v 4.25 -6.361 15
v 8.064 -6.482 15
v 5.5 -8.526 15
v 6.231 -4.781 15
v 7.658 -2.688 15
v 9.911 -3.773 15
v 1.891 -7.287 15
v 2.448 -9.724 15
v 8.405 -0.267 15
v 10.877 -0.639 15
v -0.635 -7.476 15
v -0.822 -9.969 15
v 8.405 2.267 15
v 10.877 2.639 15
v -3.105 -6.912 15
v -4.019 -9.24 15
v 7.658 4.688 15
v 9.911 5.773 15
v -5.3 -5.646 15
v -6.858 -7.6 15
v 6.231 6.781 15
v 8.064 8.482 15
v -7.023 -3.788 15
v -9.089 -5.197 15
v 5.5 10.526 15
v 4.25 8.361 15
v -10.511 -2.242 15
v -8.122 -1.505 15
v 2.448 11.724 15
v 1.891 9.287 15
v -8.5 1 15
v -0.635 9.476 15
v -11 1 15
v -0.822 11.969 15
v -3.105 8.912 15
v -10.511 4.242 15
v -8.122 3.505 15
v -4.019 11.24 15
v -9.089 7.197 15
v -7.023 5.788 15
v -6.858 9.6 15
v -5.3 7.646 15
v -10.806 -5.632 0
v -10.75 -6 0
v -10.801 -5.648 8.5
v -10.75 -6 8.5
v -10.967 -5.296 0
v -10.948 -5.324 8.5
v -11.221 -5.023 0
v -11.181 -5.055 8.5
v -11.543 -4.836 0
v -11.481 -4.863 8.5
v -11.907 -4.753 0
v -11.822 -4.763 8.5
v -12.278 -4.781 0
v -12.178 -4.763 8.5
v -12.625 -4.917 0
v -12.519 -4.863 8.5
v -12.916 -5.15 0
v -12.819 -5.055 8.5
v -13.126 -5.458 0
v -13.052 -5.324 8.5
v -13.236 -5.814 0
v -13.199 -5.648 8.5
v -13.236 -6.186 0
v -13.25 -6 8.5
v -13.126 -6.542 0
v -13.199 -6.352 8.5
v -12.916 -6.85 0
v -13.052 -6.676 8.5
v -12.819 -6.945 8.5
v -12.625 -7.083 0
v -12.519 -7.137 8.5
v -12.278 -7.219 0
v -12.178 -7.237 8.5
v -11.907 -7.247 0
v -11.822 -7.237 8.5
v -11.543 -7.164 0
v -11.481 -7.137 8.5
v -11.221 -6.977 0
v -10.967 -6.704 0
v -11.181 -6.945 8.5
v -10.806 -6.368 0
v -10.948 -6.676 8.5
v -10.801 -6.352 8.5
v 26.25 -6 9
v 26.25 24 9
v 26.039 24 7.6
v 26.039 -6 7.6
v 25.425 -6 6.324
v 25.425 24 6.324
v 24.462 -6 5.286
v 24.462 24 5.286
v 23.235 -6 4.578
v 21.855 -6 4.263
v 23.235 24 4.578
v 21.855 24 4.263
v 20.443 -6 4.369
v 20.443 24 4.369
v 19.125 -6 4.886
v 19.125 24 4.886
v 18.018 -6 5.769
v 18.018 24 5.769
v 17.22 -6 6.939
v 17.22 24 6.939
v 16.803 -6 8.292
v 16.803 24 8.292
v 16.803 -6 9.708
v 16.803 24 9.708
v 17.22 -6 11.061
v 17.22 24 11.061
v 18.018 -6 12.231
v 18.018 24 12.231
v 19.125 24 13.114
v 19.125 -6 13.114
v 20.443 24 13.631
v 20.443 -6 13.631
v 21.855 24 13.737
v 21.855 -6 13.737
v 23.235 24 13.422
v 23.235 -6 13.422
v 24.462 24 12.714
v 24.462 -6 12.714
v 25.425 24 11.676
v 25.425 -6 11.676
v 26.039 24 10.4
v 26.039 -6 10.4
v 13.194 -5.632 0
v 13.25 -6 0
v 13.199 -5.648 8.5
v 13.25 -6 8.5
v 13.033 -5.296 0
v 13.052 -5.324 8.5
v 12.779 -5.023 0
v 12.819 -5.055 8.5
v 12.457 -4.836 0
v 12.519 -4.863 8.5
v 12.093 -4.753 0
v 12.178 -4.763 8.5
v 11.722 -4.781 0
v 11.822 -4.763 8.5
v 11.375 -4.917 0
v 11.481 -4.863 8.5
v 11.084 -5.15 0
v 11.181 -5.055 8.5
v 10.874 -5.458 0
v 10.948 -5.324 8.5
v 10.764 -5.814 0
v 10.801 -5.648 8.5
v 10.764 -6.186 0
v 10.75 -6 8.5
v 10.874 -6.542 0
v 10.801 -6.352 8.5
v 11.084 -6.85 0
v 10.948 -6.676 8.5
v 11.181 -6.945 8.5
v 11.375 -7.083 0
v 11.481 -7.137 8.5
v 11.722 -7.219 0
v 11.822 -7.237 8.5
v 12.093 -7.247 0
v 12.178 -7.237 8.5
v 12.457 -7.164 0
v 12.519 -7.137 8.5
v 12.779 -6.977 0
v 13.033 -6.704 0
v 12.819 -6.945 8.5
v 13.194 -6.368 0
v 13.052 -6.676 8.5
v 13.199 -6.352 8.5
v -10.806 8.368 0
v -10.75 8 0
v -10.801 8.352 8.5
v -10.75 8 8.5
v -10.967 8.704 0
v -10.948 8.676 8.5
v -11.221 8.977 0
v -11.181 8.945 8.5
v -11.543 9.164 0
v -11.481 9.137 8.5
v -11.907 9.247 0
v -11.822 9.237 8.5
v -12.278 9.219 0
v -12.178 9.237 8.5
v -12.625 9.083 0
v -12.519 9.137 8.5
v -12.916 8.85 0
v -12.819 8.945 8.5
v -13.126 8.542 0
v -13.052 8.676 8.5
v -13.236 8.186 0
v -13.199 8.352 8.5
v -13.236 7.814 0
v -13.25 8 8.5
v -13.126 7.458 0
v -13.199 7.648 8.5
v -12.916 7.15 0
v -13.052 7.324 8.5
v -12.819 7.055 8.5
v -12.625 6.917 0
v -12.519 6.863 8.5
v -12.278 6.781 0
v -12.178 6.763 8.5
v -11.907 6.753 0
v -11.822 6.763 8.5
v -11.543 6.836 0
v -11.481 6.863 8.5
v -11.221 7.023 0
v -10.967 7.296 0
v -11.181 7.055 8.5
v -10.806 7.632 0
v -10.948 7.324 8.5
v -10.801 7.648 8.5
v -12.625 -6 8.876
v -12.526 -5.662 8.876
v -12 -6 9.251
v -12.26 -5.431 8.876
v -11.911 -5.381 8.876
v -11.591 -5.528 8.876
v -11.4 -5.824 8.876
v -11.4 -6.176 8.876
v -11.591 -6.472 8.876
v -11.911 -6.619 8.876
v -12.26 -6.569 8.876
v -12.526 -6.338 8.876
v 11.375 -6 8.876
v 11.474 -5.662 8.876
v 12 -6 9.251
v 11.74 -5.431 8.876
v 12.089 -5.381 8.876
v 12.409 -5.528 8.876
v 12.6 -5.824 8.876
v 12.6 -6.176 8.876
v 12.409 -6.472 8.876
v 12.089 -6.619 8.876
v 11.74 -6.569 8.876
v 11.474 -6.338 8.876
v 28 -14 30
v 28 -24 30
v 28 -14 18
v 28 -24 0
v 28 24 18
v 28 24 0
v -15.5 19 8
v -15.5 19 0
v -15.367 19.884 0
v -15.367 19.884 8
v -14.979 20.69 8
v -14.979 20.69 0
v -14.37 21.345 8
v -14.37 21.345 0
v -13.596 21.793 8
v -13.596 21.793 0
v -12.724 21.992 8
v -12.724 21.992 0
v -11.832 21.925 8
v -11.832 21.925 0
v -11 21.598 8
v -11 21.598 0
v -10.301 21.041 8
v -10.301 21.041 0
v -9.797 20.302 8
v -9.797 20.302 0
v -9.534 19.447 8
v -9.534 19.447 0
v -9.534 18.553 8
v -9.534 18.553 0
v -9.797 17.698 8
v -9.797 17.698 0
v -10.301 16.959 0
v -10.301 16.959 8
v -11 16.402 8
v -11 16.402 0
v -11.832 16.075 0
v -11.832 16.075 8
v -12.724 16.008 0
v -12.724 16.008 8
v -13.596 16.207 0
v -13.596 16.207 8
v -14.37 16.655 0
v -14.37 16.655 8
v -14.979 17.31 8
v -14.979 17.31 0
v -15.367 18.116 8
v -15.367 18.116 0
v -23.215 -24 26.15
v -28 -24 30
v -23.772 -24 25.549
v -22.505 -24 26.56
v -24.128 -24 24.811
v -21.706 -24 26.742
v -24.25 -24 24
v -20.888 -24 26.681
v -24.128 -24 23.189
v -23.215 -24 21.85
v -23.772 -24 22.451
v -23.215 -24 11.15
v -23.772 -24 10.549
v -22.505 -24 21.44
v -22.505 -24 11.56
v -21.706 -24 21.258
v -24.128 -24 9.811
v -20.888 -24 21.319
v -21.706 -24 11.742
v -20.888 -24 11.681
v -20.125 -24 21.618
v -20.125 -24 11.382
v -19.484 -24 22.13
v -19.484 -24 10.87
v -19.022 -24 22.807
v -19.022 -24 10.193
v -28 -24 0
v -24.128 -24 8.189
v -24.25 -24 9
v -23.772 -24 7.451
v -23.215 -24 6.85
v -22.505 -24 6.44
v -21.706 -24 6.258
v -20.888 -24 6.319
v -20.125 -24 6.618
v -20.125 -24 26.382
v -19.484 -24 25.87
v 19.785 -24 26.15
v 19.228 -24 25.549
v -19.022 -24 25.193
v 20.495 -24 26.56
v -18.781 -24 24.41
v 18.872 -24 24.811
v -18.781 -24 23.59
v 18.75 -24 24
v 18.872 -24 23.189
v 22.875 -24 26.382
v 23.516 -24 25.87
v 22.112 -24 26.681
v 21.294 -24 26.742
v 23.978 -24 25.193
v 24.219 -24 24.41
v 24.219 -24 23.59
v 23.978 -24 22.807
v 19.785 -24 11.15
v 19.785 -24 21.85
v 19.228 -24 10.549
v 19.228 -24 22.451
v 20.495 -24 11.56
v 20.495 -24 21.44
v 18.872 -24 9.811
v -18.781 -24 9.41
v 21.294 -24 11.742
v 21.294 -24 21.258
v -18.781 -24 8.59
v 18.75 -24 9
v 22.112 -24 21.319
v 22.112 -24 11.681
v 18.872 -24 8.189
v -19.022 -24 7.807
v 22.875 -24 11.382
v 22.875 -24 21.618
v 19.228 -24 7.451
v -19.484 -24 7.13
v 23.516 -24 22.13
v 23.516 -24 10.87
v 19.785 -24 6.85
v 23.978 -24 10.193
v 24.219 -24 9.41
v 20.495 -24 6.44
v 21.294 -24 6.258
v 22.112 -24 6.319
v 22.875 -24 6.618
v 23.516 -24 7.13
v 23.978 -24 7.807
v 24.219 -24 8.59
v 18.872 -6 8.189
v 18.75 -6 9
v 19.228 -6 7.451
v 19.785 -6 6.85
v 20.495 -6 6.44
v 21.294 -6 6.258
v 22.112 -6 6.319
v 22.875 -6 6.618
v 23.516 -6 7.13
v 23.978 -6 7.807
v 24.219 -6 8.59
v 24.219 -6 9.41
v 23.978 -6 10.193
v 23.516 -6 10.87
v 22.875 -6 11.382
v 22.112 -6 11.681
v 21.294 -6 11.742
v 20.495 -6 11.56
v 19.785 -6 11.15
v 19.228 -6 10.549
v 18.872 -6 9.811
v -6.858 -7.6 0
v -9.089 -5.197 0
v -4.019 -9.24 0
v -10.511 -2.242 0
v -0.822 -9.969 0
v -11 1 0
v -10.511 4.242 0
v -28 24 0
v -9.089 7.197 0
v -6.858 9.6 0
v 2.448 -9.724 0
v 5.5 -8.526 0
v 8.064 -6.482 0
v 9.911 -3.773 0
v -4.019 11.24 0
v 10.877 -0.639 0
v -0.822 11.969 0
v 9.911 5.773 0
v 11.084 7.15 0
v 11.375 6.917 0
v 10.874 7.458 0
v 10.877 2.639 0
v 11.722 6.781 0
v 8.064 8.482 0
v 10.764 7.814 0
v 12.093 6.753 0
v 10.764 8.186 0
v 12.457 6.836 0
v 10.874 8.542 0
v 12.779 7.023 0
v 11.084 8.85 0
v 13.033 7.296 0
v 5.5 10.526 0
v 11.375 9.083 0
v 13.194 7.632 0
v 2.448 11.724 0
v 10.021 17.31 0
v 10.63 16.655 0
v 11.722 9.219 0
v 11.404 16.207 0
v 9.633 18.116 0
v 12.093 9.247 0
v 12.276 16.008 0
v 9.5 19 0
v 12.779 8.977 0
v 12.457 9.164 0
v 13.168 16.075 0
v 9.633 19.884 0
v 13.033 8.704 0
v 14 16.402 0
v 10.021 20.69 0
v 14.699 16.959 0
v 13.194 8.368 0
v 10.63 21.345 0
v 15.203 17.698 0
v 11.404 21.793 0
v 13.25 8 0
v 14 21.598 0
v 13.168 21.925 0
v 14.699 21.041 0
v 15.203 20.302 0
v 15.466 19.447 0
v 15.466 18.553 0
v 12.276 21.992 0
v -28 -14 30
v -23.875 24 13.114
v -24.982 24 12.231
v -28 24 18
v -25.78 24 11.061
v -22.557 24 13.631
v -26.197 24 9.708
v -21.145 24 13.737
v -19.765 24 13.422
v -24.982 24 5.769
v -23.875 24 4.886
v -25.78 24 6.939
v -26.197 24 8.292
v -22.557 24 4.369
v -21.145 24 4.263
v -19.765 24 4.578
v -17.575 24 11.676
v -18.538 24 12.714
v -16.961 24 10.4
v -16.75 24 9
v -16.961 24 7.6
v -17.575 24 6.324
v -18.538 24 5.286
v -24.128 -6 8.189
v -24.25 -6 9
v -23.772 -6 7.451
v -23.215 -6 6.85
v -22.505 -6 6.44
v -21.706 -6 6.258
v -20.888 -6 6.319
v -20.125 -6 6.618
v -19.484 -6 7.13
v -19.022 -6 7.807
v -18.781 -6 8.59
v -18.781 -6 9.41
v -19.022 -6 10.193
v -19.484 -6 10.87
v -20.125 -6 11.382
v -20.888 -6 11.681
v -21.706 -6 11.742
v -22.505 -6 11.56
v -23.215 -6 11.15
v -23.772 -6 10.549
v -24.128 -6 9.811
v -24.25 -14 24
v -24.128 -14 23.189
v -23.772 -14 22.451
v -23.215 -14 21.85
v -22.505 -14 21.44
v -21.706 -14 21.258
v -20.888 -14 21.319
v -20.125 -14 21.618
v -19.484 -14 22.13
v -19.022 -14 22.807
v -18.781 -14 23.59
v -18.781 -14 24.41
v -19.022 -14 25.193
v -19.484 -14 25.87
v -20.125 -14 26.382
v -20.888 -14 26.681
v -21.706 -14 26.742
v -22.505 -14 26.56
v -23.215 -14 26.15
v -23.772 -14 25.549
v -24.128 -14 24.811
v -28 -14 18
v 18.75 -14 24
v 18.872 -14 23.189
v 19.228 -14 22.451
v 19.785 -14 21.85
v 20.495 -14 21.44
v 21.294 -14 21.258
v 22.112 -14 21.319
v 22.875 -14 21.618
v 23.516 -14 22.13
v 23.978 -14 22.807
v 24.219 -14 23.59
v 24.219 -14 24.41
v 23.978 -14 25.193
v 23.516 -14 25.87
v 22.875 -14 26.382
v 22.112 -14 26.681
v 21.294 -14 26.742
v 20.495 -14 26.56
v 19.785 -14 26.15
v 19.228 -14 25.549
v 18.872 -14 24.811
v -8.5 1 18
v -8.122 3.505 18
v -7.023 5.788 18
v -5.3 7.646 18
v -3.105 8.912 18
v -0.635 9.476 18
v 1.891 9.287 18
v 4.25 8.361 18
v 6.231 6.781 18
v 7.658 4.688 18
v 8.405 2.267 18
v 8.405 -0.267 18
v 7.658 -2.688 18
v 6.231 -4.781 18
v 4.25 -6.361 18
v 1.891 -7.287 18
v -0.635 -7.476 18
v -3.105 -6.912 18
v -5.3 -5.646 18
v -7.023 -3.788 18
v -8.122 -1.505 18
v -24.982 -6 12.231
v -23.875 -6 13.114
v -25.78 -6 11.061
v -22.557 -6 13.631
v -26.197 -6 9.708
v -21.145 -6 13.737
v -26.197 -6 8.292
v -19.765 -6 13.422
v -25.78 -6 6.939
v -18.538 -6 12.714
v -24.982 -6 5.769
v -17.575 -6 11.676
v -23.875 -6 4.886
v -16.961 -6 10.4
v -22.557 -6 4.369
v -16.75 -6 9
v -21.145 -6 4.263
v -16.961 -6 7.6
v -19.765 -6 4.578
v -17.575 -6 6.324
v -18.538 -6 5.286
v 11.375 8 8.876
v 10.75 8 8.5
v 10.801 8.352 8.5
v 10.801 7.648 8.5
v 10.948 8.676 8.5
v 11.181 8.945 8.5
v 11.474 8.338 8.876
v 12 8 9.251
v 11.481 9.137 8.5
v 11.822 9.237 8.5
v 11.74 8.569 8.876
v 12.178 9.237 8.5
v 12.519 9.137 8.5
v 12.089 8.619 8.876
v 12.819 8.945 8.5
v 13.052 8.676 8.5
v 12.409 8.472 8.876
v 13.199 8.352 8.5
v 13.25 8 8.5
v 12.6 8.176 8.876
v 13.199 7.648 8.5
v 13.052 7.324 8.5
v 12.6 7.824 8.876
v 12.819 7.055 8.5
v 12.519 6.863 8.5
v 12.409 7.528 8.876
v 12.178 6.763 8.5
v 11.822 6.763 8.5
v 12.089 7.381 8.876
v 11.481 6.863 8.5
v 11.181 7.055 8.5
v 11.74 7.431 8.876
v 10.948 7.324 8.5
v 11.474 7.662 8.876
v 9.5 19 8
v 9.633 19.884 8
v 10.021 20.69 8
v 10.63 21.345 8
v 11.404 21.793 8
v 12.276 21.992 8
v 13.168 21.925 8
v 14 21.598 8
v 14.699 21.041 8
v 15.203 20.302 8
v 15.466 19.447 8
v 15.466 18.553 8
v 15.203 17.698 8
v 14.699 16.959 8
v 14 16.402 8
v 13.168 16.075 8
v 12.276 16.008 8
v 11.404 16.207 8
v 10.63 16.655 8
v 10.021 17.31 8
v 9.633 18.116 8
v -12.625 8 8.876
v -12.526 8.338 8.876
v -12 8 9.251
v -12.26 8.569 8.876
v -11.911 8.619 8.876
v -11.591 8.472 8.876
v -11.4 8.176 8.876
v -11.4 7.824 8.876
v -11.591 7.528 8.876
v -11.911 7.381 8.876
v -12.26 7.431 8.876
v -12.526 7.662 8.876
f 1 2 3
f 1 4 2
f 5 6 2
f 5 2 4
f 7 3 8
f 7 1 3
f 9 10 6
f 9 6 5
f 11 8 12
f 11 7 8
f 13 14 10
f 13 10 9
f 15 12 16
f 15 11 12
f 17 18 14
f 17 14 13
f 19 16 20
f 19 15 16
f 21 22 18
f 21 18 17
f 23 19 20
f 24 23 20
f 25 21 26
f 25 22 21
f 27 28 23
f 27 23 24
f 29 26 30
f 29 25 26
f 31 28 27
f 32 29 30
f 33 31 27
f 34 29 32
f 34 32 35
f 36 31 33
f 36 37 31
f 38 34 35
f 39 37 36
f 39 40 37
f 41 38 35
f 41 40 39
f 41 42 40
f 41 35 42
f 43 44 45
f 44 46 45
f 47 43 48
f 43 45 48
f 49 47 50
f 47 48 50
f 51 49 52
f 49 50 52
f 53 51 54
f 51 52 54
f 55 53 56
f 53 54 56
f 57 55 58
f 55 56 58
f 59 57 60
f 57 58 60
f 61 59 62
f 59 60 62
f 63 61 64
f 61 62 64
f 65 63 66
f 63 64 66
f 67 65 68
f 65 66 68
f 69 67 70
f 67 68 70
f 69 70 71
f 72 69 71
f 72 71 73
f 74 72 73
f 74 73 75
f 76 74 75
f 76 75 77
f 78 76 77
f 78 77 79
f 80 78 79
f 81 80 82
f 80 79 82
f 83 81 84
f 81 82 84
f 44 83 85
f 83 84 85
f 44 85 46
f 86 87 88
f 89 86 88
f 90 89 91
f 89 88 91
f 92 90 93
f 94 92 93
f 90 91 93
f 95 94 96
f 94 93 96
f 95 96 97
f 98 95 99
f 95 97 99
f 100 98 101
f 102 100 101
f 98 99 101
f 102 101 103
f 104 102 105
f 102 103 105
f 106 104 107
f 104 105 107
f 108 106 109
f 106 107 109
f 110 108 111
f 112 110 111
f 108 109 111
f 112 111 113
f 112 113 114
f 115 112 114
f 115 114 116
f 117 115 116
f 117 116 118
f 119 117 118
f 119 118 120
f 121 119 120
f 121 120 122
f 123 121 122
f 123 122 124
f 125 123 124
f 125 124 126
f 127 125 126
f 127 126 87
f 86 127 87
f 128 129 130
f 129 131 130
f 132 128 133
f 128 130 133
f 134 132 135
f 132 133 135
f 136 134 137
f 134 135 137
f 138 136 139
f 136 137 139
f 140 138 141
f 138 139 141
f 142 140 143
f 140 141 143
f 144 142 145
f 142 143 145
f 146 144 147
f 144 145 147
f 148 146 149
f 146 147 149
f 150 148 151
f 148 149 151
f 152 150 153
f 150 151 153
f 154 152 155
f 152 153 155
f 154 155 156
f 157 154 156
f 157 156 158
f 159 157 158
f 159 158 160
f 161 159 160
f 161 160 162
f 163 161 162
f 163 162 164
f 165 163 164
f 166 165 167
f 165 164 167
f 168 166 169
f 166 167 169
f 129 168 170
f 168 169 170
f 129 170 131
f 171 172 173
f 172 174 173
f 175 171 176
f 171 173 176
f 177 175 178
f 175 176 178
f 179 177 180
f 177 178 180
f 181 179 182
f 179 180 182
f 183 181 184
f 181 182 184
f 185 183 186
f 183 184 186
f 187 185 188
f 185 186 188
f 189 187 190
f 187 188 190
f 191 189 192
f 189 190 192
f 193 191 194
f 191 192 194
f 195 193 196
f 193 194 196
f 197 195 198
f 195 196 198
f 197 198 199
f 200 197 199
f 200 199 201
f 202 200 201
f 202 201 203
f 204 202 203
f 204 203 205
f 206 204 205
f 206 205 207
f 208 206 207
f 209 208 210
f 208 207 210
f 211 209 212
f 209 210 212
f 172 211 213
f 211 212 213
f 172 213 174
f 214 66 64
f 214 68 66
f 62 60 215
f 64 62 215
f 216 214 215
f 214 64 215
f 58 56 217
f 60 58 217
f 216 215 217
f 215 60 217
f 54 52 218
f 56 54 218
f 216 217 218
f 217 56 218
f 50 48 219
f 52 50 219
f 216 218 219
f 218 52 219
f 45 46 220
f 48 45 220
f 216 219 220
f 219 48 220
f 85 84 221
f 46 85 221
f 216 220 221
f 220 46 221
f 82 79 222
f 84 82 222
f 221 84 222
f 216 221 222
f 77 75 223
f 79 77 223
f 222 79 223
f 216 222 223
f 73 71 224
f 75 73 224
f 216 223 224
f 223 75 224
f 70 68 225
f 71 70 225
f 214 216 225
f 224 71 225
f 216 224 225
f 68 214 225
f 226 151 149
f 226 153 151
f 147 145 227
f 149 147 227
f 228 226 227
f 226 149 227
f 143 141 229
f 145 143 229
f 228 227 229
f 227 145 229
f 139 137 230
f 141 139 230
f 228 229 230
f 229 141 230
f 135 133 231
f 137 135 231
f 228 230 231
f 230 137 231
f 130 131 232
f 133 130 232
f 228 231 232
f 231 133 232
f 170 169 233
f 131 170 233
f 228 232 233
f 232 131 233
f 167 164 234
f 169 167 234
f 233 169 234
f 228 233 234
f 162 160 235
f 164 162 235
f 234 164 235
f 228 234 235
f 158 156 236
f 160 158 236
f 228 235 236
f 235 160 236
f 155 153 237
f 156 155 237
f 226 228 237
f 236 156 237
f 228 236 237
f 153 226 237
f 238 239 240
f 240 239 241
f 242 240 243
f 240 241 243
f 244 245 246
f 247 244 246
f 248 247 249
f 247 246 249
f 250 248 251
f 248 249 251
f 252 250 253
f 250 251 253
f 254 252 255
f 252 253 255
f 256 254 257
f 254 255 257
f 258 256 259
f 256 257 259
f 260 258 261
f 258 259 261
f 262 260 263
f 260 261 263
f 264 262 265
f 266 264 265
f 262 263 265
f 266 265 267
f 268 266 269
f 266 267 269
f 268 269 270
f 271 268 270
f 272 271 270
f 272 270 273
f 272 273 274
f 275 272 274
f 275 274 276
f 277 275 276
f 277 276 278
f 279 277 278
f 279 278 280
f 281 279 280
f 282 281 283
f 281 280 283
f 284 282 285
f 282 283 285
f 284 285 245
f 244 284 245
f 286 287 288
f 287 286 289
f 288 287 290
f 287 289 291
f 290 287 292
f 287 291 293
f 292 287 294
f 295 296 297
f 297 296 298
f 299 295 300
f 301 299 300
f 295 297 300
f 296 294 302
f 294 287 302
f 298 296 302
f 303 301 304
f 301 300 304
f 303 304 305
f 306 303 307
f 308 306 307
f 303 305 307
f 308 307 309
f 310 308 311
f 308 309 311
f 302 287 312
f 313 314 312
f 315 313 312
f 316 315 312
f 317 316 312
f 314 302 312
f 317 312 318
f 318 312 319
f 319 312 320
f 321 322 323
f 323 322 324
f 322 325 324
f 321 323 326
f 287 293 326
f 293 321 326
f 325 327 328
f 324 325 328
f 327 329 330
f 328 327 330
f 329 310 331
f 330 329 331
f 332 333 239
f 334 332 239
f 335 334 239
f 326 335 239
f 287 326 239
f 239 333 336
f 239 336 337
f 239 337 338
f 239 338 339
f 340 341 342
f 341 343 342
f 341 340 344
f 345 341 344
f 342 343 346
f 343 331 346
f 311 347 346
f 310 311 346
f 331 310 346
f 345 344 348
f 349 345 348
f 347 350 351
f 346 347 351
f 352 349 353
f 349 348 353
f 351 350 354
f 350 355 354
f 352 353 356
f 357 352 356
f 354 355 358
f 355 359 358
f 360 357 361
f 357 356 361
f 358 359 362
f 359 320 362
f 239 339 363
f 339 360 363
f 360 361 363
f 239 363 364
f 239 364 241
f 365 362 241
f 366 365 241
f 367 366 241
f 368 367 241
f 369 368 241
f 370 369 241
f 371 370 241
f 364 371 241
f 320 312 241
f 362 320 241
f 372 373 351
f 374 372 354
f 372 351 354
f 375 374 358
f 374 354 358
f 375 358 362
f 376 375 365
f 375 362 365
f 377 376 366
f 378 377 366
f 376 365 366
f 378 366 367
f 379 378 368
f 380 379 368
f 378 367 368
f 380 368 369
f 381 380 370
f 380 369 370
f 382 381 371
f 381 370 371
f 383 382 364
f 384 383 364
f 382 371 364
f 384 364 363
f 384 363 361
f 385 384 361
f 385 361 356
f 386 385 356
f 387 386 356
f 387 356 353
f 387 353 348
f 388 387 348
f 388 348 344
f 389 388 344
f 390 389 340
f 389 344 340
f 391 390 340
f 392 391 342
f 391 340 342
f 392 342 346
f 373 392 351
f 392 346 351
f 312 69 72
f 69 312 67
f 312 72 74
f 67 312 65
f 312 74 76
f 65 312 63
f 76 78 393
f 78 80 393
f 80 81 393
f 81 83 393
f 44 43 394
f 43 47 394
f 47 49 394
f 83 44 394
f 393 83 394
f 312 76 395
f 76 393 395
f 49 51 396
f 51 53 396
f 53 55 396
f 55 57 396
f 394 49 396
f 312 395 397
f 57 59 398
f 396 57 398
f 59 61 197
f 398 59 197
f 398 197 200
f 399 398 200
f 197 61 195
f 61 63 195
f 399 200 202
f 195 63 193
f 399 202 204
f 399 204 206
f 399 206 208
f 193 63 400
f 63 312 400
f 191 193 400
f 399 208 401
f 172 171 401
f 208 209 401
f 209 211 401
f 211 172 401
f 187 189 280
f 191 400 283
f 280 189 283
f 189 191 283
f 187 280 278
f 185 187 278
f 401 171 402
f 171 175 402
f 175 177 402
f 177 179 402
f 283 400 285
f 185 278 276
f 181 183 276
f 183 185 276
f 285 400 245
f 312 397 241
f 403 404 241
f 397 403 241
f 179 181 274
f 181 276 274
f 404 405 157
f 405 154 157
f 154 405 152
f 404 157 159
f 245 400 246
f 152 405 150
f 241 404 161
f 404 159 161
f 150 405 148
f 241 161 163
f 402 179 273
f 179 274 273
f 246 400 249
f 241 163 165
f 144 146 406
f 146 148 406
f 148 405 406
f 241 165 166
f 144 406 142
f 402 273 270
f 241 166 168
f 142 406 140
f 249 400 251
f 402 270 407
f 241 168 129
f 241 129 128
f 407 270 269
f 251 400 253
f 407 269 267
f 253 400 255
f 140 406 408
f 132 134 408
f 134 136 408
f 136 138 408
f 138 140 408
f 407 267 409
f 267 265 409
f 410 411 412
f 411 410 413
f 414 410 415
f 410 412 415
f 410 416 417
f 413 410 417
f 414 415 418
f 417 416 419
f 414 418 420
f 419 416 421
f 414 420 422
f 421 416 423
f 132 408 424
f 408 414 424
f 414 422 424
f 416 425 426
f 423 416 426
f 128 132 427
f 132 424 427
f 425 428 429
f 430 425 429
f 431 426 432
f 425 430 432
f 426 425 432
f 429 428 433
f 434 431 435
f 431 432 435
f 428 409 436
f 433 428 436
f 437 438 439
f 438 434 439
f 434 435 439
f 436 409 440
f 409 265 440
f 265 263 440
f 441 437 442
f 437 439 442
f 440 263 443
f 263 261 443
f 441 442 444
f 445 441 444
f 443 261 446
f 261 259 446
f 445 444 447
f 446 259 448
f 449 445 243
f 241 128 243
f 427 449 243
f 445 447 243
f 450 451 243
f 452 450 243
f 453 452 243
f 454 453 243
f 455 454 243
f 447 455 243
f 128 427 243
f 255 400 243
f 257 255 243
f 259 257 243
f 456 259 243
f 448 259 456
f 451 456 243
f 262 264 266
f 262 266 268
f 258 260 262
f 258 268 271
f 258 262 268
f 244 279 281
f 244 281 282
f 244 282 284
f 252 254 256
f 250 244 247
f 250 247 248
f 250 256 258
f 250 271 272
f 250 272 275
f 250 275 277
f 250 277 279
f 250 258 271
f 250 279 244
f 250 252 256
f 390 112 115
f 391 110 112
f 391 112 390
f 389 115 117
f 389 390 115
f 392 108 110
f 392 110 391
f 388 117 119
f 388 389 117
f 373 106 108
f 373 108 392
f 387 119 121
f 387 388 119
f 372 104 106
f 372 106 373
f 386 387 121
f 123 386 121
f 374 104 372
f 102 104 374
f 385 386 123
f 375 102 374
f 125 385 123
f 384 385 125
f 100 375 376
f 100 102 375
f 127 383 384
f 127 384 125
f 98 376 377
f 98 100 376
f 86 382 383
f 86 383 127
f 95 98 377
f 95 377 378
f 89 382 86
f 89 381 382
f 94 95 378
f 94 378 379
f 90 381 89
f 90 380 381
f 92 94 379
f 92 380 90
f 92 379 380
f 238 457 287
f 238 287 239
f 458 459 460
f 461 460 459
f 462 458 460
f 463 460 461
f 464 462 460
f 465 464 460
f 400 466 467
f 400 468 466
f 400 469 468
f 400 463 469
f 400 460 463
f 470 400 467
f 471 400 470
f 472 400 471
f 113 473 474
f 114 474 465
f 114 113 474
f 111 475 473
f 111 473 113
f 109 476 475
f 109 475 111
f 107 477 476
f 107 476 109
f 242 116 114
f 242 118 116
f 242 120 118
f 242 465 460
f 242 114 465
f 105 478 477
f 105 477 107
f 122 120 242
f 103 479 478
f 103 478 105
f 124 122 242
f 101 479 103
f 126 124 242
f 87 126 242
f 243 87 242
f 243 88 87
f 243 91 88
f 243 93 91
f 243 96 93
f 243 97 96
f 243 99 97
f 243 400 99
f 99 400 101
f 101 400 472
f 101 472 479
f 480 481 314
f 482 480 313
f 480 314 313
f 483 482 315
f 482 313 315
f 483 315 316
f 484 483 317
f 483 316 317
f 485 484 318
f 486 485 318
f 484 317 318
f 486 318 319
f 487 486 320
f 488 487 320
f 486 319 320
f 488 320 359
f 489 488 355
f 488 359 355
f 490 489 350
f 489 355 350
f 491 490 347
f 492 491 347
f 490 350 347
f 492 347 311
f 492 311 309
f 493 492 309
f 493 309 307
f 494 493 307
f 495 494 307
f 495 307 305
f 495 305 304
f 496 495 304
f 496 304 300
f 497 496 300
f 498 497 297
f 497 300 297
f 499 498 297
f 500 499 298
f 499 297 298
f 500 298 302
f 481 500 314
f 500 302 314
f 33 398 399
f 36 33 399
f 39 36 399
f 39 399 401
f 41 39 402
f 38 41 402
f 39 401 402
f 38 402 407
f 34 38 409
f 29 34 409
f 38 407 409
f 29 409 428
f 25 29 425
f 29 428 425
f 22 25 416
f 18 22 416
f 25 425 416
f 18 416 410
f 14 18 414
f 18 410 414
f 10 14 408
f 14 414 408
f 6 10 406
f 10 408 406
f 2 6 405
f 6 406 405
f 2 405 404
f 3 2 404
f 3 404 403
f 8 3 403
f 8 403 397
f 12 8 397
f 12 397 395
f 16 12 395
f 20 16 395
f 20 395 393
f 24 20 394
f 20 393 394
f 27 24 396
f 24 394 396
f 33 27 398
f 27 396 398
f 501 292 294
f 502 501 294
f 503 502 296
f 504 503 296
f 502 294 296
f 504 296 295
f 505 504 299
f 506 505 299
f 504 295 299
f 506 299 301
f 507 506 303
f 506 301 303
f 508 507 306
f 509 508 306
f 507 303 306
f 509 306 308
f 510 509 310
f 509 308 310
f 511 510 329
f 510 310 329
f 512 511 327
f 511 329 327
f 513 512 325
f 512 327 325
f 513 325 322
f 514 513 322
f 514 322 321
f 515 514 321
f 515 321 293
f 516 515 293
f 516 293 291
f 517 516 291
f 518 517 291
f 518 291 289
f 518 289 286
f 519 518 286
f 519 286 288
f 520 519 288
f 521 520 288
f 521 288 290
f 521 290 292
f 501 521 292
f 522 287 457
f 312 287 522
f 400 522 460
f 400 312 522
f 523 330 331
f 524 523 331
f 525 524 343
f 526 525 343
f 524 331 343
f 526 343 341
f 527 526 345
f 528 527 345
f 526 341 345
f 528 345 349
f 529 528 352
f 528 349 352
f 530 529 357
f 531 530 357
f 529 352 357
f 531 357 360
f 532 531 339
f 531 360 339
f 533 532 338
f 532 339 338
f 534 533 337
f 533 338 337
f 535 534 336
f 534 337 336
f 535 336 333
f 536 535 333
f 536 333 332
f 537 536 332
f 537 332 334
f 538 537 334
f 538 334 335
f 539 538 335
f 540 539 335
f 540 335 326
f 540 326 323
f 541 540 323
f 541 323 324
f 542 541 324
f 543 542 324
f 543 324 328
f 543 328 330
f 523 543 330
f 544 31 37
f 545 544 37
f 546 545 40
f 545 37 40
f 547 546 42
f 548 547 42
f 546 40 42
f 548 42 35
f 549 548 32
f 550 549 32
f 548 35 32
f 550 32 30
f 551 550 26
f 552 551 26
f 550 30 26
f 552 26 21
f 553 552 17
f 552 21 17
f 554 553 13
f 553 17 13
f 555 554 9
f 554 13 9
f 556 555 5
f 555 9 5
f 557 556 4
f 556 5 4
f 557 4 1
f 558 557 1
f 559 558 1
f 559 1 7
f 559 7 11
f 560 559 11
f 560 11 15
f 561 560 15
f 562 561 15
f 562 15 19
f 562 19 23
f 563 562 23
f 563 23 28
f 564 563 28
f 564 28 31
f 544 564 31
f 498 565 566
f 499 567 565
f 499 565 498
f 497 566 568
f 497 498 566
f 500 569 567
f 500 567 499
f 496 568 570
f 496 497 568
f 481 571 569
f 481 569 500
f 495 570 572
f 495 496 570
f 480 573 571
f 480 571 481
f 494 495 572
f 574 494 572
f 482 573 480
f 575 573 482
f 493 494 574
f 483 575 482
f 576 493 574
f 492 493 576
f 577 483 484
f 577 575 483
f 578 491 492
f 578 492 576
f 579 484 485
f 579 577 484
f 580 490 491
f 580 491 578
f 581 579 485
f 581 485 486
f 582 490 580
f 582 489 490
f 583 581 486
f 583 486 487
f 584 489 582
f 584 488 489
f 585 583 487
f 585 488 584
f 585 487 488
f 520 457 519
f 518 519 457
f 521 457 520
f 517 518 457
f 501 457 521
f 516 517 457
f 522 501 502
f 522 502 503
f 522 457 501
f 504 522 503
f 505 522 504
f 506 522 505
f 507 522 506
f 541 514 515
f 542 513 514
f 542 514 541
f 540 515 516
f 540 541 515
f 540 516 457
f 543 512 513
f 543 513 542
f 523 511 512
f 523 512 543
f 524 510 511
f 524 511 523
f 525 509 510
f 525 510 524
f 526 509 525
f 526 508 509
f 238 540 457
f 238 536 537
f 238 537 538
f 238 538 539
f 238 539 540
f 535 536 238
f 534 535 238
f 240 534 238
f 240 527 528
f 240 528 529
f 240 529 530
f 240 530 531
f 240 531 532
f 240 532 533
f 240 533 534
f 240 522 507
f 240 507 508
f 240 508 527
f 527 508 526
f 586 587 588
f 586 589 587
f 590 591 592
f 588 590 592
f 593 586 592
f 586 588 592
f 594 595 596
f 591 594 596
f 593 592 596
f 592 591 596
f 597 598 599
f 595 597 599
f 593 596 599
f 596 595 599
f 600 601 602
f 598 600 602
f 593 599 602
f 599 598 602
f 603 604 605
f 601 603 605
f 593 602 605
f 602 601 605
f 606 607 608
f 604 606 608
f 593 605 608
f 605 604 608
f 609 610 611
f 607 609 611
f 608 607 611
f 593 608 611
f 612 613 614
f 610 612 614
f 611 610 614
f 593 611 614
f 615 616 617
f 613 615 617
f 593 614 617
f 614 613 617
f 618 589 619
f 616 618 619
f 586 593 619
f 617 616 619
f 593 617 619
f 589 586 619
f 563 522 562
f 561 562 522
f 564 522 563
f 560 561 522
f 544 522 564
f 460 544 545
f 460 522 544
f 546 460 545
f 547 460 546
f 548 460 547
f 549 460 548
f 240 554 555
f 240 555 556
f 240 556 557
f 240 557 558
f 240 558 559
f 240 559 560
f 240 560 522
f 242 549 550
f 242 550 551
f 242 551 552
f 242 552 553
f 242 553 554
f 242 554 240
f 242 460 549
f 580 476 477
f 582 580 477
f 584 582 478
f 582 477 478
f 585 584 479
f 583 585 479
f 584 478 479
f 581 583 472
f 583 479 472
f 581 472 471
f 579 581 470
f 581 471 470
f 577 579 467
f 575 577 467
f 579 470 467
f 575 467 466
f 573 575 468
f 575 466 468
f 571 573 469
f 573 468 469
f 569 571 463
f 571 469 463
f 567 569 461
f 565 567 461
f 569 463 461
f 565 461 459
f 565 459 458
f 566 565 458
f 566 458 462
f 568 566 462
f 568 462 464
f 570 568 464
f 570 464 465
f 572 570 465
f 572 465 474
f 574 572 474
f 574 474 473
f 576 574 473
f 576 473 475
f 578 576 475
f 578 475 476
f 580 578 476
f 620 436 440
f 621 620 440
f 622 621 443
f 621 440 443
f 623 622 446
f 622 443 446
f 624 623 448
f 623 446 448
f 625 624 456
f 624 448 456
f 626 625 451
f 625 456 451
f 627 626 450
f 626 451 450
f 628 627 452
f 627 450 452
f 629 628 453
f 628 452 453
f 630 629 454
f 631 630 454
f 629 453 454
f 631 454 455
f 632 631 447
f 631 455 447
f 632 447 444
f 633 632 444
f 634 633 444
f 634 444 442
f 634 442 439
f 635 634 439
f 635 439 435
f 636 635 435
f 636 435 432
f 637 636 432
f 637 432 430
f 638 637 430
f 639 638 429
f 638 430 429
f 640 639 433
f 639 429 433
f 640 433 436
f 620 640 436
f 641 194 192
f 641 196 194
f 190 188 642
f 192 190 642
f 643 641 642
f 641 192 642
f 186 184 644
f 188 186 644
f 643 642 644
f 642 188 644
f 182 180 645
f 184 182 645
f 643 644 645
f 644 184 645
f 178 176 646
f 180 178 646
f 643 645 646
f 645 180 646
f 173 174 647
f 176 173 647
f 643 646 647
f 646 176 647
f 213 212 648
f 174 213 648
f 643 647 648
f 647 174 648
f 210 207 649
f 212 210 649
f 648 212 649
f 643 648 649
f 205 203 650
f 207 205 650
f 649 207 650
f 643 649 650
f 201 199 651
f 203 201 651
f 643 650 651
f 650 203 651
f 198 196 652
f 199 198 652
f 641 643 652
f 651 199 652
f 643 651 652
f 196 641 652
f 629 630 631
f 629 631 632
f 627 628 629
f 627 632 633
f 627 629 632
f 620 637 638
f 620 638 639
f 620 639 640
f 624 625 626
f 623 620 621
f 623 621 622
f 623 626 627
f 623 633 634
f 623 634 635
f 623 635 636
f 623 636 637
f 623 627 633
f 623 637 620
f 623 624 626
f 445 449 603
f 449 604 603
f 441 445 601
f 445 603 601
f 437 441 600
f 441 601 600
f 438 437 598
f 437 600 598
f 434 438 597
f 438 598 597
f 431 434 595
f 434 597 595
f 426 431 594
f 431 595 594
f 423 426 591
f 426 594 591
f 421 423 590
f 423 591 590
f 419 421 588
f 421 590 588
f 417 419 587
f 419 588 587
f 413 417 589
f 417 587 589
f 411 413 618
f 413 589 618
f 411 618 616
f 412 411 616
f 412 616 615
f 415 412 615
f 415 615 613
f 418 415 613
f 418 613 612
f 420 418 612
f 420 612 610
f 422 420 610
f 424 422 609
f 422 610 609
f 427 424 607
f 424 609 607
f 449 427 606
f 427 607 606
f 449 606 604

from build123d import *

# Parameters (mm, degrees)
SKETCH_1_W                   = 56
SKETCH_1_H                   = 48
EXTRUDE_1_DEPTH              = 18
SKETCH_9_R                   = 11
CUT_EXTRUDE_3_DEPTH          = 15
SKETCH_10_R                  = 8.5
CUT_EXTRUDE_4_DEPTH          = 17
HOLE_WIZARD_M3_2_D           = 2.5
HOLE_WIZARD_M3_2_DEPTH       = 8.5
HOLE_WIZARD_M3_2_TIP         = 0.751075774
HOLE_WIZARD_M5_1_D           = 5.5
HOLE_WIZARD_M5_1_CBORE_D     = 9.5
HOLE_WIZARD_M5_1_CBORE_DEPTH = 30
SKETCH_17_W                  = 56
SKETCH_17_H                  = 10
EXTRUDE_5_DEPTH              = 12
HOLE_WIZARD_5_5_5_5_1_D      = 5.5
SKETCH_21_R                  = 3
CUT_EXTRUDE_5_DEPTH          = 8


with BuildPart() as part:
    # 草图1 → 凸台-拉伸1 (new body)
    with BuildSketch(Plane.XY):
        Rectangle(SKETCH_1_W, SKETCH_1_H)
    extrude(amount=EXTRUDE_1_DEPTH)

    # 草图9 → 切除-拉伸3 (cut)
    with BuildSketch(Plane(origin=(0, 0, 0), x_dir=(-1, 0, 0), z_dir=(0, 0, -1))):
        with Locations((0, 1)):
            Circle(SKETCH_9_R)
    extrude(amount=-CUT_EXTRUDE_3_DEPTH, mode=Mode.SUBTRACT)

    # 草图10 → 切除-拉伸4 (cut)
    with BuildSketch(Plane(origin=(0, 0, 15), x_dir=(-1, 0, 0), z_dir=(0, 0, -1))):
        with Locations((0, 1)):
            Circle(SKETCH_10_R)
    extrude(amount=-CUT_EXTRUDE_4_DEPTH, mode=Mode.SUBTRACT)

    # M3 螺纹孔2
    with Locations(Plane(origin=(0, 0, 0), x_dir=(-1, 0, 0), z_dir=(0, 0, -1))):
        with Locations((12, 8), (-12, 8), (12, -6), (-12, -6)):
            Hole(HOLE_WIZARD_M3_2_D / 2, depth=HOLE_WIZARD_M3_2_DEPTH)
            with Locations((0, 0, -(HOLE_WIZARD_M3_2_DEPTH + HOLE_WIZARD_M3_2_TIP / 2))):  # 118° drill point
                Cone(0, HOLE_WIZARD_M3_2_D / 2, HOLE_WIZARD_M3_2_TIP, mode=Mode.SUBTRACT)

    # M5 六角头螺栓的柱形沉头孔1 (through all)
    with Locations(Plane(origin=(-28, 24, 18.039237195), x_dir=(1, 0, 0), z_dir=(0, 1, 0))):
        with Locations((6.5, 9.039237195), (49.5, 9.039237195)):
            CounterBoreHole(HOLE_WIZARD_M5_1_D / 2, HOLE_WIZARD_M5_1_CBORE_D / 2, HOLE_WIZARD_M5_1_CBORE_DEPTH)

    # 草图17 → 凸台-拉伸5 (add)
    with BuildSketch(Plane.XY.offset(18)):
        with Locations((0, -19)):
            Rectangle(SKETCH_17_W, SKETCH_17_H)
    extrude(amount=EXTRUDE_5_DEPTH)

    # Ø5.5 (5.5) 直径孔1 (through all)
    with Locations(Plane(origin=(0, -14, 0), x_dir=(1, 0, 0), z_dir=(0, 1, 0))):
        with Locations((-21.5, -24), (21.5, -24)):
            Hole(HOLE_WIZARD_5_5_5_5_1_D / 2)

    # 草图21 → 切除-拉伸5 (cut)
    with BuildSketch(Plane(origin=(0, 0, 0), x_dir=(-1, 0, 0), z_dir=(0, 0, -1))):
        with Locations((-12.5, 19)):
            Circle(SKETCH_21_R)
        with Locations((12.5, 19)):
            Circle(SKETCH_21_R)
    extrude(amount=-CUT_EXTRUDE_5_DEPTH, mode=Mode.SUBTRACT)


solid = part.part
